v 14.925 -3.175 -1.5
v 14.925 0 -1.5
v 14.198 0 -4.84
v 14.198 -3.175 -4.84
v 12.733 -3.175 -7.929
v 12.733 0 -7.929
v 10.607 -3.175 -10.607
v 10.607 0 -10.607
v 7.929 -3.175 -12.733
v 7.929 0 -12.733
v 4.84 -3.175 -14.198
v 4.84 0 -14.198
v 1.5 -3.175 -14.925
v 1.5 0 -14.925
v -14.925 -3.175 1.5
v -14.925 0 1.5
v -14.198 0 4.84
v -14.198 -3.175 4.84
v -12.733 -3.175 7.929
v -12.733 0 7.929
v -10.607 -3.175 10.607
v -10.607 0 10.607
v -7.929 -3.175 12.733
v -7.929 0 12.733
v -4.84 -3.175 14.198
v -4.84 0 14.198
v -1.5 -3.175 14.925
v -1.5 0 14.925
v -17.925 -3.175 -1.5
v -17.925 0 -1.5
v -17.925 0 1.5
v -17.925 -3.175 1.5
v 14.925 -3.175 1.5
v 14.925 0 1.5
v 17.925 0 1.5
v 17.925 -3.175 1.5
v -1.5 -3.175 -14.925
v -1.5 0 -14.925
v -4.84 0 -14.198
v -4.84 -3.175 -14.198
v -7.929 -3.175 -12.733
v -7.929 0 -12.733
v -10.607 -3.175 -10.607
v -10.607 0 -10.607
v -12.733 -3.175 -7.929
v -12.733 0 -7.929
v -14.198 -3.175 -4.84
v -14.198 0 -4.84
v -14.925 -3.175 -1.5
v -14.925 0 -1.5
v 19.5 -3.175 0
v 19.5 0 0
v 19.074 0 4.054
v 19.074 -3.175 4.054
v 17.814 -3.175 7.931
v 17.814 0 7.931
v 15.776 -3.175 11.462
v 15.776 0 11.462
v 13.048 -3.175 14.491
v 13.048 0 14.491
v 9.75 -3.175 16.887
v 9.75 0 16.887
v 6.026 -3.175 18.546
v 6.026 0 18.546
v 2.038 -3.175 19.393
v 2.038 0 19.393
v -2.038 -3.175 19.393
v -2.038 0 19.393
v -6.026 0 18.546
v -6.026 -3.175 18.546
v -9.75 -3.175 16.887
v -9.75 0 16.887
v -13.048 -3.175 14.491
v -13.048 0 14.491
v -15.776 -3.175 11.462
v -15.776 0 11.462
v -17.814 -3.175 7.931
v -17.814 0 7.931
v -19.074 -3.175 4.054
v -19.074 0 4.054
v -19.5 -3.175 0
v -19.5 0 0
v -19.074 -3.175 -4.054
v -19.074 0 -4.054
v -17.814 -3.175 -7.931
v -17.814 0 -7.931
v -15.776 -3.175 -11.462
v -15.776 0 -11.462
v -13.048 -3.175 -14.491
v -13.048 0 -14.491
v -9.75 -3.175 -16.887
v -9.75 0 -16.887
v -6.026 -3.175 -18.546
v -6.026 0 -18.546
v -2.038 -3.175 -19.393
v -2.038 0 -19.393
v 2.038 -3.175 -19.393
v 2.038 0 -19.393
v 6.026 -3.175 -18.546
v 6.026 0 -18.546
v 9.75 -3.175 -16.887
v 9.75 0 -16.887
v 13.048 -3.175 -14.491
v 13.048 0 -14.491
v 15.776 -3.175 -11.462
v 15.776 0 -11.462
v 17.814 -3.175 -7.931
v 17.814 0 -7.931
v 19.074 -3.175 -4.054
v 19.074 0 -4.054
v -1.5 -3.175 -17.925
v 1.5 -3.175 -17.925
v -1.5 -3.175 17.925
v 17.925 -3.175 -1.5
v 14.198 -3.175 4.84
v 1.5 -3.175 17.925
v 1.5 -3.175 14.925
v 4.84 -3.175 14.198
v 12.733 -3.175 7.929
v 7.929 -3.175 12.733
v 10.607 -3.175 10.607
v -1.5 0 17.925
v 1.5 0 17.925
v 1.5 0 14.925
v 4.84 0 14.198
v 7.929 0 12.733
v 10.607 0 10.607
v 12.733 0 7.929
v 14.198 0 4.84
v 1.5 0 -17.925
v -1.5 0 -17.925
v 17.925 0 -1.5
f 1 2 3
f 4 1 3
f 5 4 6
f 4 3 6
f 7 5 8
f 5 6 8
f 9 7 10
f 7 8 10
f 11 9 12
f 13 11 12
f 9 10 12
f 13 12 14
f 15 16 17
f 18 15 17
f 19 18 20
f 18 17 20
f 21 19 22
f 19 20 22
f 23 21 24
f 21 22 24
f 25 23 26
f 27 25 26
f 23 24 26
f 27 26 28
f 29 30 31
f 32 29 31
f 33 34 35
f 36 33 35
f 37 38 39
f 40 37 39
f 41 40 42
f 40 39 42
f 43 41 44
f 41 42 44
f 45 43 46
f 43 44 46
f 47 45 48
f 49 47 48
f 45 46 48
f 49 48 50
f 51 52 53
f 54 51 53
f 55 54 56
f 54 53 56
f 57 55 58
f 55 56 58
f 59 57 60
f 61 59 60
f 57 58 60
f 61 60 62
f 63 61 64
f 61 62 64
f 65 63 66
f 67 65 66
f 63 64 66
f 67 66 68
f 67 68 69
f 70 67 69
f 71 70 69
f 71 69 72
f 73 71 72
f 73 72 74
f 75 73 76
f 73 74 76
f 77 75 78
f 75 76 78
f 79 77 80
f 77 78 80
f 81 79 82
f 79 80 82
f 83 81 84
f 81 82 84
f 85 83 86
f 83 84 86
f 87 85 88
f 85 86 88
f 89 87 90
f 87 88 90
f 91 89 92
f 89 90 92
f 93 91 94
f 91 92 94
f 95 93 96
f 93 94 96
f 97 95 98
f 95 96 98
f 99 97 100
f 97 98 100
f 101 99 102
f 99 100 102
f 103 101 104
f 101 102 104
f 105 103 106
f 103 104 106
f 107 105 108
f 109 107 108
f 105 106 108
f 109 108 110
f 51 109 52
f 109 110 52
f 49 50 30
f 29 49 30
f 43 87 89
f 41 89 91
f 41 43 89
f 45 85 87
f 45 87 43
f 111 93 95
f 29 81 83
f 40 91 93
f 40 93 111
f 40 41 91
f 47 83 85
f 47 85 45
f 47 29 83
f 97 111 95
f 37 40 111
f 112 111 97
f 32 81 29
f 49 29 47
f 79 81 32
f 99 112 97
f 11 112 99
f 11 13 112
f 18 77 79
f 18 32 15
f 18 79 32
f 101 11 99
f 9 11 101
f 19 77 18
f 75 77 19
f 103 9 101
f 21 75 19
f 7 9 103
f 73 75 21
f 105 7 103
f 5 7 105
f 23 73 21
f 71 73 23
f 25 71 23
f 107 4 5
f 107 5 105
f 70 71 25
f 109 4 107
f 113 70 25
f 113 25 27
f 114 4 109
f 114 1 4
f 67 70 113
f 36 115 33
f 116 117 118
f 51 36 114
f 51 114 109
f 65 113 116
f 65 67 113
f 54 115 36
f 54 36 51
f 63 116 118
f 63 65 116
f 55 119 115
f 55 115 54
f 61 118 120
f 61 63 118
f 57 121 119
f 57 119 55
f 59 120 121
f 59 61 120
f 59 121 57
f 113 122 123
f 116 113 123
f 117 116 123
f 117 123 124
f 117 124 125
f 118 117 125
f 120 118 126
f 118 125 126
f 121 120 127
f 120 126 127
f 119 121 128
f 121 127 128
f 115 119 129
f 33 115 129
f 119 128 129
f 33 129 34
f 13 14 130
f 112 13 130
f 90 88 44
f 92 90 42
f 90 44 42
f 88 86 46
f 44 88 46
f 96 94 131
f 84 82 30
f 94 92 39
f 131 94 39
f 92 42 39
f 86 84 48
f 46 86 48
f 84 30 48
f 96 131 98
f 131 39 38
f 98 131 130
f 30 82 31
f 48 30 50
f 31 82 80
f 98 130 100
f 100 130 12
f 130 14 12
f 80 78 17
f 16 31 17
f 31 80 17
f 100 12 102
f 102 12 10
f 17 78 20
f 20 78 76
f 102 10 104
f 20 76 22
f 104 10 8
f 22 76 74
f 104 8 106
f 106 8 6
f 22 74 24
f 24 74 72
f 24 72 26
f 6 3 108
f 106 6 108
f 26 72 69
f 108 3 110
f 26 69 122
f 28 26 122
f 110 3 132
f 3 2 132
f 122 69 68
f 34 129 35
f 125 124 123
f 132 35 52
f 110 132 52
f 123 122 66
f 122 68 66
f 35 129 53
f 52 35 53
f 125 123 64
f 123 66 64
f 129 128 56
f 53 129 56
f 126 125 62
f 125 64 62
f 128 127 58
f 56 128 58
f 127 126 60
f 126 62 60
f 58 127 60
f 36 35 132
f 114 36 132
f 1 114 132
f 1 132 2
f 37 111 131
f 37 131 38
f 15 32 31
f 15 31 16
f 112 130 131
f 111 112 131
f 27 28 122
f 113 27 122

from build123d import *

# Parameters (mm, degrees)
F0_R     = 19.5
F1_DEPTH = 3.175


# Not quite as in the source:
# - a length typed as a fraction of an inch, garbled in the dataset ("3 / 203.2 mm" for 3/8 in), is restored


with BuildPart() as f1:
    # F0 (on Front) → F1 (new body)
    with BuildSketch(Plane.XZ):
        Circle(F0_R)
        with BuildLine():
            ThreePointArc((1.5, 14.9248115566), (10.6066017178, 10.6066017178), (14.9248115566, 1.5))
            Line((14.9248115566, 1.5), (17.9248115566, 1.5))
            Line((17.9248115566, 1.5), (17.9248115566, -1.5))
            Line((17.9248115566, -1.5), (14.9248115566, -1.5))
            ThreePointArc((14.9248115566, -1.5), (10.6066017178, -10.6066017178), (1.5, -14.9248115566))
            Line((1.5, -14.9248115566), (1.5, -17.9248115566))
            Line((1.5, -17.9248115566), (-1.5, -17.9248115566))
            Line((-1.5, -17.9248115566), (-1.5, -14.9248115566))
            ThreePointArc((-1.5, -14.9248115566), (-10.6066017178, -10.6066017178), (-14.9248115566, -1.5))
            Line((-14.9248115566, -1.5), (-17.9248115566, -1.5))
            Line((-17.9248115566, -1.5), (-17.9248115566, 1.5))
            Line((-17.9248115566, 1.5), (-14.9248115566, 1.5))
            ThreePointArc((-14.9248115566, 1.5), (-10.6066017178, 10.6066017178), (-1.5, 14.9248115566))
            Line((-1.5, 14.9248115566), (-1.5, 17.9248115566))
            Line((-1.5, 17.9248115566), (1.5, 17.9248115566))
            Line((1.5, 17.9248115566), (1.5, 14.9248115566))
        make_face(mode=Mode.SUBTRACT)
    extrude(amount=F1_DEPTH)


solid = f1.part
